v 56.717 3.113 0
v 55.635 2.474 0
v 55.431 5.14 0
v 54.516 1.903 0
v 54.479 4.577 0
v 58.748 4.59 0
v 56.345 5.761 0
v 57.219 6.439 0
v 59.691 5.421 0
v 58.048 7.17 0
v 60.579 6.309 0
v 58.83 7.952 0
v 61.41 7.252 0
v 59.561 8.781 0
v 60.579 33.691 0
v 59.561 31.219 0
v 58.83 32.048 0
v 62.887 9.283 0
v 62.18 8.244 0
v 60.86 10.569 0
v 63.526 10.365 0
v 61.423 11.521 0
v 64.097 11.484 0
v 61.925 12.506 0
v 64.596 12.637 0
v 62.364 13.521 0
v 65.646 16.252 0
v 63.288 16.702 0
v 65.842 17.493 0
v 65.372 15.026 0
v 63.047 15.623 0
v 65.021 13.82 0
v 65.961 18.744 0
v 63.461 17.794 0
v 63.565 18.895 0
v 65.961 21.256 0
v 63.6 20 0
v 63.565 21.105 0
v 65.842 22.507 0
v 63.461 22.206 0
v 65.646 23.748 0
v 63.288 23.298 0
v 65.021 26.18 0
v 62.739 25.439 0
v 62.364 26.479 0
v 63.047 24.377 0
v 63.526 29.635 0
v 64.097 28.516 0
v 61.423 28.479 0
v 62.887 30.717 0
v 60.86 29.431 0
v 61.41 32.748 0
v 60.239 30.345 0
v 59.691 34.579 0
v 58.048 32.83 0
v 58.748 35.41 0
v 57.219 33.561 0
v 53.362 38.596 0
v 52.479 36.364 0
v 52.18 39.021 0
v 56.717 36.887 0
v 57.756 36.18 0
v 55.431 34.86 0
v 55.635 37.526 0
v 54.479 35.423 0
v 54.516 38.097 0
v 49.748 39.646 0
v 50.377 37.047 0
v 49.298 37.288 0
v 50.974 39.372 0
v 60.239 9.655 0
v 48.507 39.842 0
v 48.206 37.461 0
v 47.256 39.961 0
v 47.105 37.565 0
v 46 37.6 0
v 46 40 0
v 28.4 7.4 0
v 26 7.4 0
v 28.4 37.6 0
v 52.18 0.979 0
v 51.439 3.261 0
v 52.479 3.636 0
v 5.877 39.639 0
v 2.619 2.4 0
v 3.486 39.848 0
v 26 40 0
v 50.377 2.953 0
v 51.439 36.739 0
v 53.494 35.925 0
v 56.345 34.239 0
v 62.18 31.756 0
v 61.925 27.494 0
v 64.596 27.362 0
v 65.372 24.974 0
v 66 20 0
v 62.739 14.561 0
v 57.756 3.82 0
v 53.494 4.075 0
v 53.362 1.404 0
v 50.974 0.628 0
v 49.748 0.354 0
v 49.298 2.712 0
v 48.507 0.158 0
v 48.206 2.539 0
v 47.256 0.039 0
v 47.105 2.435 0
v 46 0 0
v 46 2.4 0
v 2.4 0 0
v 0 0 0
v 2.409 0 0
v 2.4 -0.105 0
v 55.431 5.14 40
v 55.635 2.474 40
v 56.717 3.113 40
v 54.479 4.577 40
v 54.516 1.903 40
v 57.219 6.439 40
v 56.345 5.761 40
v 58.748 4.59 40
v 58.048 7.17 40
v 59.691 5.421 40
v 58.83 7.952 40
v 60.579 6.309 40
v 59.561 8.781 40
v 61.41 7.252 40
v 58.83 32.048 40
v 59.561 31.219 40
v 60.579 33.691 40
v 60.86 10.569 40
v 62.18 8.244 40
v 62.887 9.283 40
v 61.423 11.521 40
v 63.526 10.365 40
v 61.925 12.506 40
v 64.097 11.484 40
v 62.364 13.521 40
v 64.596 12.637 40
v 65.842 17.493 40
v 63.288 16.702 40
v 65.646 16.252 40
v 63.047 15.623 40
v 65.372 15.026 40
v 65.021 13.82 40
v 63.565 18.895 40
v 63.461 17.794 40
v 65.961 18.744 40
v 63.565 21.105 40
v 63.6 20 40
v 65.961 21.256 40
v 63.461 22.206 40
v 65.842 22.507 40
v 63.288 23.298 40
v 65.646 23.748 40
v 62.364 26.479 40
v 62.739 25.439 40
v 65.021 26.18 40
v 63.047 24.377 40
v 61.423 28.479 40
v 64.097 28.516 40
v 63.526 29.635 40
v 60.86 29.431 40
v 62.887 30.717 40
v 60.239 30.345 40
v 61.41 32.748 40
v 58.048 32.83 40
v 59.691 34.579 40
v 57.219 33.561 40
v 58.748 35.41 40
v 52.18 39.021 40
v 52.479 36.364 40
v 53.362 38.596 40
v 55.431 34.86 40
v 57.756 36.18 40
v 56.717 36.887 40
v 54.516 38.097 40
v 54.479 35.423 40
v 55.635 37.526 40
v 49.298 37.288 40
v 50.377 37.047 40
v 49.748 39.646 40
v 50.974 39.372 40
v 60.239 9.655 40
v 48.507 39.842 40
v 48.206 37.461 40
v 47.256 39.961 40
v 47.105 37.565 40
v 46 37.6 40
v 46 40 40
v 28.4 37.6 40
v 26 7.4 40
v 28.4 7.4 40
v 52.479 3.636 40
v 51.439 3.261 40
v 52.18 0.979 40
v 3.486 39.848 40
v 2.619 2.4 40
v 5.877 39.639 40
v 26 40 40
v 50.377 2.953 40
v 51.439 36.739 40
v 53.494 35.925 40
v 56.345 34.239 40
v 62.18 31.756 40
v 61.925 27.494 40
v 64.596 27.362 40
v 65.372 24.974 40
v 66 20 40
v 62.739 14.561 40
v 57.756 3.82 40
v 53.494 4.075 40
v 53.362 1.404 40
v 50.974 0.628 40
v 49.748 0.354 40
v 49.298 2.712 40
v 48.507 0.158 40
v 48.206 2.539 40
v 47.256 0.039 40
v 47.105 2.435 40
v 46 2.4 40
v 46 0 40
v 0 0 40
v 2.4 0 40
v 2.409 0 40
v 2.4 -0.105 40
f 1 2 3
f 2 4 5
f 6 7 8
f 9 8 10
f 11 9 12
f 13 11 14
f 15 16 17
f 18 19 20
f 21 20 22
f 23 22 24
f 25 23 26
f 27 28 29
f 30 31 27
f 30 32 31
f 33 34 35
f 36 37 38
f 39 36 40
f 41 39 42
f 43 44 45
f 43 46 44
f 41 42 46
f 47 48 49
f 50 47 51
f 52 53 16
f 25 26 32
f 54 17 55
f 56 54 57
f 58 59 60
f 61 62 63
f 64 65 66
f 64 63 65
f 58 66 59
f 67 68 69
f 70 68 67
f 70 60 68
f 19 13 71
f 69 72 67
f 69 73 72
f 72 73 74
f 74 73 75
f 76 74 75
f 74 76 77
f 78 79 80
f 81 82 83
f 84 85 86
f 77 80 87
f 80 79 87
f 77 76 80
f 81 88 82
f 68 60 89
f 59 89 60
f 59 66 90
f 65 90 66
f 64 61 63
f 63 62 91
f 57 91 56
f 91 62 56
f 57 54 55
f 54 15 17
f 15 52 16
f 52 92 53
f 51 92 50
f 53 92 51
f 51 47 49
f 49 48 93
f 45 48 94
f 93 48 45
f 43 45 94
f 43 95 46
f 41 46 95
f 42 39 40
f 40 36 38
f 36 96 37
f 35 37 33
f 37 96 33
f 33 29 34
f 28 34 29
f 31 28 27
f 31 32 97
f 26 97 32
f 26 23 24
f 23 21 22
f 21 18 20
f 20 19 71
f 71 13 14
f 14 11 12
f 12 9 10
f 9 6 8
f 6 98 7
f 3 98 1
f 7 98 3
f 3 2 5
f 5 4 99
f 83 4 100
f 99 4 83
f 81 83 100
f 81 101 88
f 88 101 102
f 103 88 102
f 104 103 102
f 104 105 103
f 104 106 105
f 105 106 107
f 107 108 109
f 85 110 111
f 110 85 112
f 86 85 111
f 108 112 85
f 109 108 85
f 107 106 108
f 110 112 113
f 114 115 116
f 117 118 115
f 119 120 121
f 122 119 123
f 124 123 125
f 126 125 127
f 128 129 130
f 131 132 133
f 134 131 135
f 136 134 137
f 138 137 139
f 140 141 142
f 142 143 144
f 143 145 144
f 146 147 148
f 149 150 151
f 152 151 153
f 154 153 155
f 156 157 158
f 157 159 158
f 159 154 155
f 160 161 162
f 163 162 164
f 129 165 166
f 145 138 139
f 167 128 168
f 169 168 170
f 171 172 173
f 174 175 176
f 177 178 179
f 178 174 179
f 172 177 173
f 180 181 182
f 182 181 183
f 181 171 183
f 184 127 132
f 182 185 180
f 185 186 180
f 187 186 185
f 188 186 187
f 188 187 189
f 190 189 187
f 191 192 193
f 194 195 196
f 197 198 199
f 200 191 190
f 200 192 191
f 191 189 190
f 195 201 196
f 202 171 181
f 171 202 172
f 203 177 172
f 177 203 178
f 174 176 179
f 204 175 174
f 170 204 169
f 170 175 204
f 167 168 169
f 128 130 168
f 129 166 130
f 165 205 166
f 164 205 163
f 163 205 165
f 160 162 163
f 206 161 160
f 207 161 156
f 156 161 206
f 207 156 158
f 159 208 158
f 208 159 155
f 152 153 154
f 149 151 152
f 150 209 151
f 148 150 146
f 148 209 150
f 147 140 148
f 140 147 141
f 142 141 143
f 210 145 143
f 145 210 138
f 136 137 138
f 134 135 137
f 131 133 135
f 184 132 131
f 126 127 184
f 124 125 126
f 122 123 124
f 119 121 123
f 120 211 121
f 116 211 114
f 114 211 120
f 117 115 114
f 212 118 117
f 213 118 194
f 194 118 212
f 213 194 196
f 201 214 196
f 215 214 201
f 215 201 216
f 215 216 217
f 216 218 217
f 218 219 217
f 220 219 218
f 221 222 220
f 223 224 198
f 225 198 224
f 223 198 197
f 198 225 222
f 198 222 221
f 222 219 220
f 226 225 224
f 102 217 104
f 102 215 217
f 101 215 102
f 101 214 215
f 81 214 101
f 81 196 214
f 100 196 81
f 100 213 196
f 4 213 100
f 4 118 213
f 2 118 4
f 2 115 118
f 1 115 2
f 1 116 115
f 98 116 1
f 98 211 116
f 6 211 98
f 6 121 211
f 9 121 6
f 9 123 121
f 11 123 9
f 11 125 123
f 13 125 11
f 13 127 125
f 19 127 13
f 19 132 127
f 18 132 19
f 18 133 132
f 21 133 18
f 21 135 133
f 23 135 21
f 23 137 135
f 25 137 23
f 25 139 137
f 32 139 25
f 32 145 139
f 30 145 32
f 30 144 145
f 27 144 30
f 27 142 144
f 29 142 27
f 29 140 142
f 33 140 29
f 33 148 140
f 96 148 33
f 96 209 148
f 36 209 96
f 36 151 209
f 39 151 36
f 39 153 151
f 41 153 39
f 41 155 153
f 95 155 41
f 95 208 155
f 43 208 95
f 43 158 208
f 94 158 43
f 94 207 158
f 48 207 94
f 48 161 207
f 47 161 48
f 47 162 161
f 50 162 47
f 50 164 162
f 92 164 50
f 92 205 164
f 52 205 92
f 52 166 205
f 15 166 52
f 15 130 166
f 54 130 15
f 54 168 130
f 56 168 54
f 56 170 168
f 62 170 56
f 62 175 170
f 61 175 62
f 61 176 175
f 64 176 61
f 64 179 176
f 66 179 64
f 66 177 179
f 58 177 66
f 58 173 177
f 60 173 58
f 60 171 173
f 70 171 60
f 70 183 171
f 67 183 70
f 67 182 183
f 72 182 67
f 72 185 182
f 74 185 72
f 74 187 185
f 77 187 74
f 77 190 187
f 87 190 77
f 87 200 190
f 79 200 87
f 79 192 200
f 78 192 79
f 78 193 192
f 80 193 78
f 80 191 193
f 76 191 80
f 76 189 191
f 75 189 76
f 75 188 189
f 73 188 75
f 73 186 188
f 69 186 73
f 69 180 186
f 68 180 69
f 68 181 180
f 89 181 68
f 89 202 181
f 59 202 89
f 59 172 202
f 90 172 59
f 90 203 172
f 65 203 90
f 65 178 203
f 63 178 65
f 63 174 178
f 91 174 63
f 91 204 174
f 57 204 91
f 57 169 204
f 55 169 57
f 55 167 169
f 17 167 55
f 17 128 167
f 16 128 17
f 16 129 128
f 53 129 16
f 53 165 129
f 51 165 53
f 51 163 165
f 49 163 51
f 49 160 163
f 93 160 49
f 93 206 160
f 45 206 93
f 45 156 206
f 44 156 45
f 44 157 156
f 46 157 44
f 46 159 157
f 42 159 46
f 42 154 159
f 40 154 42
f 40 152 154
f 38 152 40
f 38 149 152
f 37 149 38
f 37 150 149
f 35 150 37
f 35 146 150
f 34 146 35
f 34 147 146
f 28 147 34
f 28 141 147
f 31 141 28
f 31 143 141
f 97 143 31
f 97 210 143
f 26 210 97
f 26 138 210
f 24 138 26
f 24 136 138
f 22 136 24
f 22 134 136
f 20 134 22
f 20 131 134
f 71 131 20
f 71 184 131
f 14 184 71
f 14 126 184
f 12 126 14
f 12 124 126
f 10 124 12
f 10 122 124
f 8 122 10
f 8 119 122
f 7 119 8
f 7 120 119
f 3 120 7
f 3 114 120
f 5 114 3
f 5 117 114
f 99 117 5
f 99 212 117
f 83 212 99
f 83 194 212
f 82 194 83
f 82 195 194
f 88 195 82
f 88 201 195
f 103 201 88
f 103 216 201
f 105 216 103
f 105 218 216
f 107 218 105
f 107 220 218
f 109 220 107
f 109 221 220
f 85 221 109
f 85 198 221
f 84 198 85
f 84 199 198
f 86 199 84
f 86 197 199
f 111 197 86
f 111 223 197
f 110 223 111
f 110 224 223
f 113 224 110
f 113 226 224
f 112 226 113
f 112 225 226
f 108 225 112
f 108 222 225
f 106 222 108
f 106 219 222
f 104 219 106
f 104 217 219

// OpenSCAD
// Generated by SolidPython 1.1.3 on 2022-08-08 21:38:44


linear_extrude(height = 40) {
	union() {
		difference() {
			rotate(a = [0, 0, -5]) {
				square(size = [2.4000000000, 40]);
			}
			difference() {
				square(center = true, size = [4.8000000000, 4.8000000000]);
				intersection() {
					rotate(a = [0, 0, -5]) {
						square(size = [2.4000000000, 40]);
					}
					square(size = [46.0000000000, 2.4000000000]);
				}
			}
		}
		difference() {
			square(size = [46.0000000000, 2.4000000000]);
			difference() {
				square(center = true, size = [4.8000000000, 4.8000000000]);
				intersection() {
					rotate(a = [0, 0, -5]) {
						square(size = [2.4000000000, 40]);
					}
					square(size = [46.0000000000, 2.4000000000]);
				}
			}
		}
		difference() {
			translate(v = [46.0000000000, 20.0000000000]) {
				circle($fn = 100, d = 40);
			}
			translate(v = [46.0000000000, 20.0000000000]) {
				circle($fn = 100, d = 35.2000000000);
			}
			translate(v = [36.0000000000, 20.0000000000]) {
				square(center = true, size = [20.0000000000, 40]);
			}
		}
		translate(v = [26, 37.6000000000]) {
			square(size = [20.0000000000, 2.4000000000]);
		}
		translate(v = [26, 7.4000000000]) {
			square(size = [2.4000000000, 32.6000000000]);
		}
	}
}
